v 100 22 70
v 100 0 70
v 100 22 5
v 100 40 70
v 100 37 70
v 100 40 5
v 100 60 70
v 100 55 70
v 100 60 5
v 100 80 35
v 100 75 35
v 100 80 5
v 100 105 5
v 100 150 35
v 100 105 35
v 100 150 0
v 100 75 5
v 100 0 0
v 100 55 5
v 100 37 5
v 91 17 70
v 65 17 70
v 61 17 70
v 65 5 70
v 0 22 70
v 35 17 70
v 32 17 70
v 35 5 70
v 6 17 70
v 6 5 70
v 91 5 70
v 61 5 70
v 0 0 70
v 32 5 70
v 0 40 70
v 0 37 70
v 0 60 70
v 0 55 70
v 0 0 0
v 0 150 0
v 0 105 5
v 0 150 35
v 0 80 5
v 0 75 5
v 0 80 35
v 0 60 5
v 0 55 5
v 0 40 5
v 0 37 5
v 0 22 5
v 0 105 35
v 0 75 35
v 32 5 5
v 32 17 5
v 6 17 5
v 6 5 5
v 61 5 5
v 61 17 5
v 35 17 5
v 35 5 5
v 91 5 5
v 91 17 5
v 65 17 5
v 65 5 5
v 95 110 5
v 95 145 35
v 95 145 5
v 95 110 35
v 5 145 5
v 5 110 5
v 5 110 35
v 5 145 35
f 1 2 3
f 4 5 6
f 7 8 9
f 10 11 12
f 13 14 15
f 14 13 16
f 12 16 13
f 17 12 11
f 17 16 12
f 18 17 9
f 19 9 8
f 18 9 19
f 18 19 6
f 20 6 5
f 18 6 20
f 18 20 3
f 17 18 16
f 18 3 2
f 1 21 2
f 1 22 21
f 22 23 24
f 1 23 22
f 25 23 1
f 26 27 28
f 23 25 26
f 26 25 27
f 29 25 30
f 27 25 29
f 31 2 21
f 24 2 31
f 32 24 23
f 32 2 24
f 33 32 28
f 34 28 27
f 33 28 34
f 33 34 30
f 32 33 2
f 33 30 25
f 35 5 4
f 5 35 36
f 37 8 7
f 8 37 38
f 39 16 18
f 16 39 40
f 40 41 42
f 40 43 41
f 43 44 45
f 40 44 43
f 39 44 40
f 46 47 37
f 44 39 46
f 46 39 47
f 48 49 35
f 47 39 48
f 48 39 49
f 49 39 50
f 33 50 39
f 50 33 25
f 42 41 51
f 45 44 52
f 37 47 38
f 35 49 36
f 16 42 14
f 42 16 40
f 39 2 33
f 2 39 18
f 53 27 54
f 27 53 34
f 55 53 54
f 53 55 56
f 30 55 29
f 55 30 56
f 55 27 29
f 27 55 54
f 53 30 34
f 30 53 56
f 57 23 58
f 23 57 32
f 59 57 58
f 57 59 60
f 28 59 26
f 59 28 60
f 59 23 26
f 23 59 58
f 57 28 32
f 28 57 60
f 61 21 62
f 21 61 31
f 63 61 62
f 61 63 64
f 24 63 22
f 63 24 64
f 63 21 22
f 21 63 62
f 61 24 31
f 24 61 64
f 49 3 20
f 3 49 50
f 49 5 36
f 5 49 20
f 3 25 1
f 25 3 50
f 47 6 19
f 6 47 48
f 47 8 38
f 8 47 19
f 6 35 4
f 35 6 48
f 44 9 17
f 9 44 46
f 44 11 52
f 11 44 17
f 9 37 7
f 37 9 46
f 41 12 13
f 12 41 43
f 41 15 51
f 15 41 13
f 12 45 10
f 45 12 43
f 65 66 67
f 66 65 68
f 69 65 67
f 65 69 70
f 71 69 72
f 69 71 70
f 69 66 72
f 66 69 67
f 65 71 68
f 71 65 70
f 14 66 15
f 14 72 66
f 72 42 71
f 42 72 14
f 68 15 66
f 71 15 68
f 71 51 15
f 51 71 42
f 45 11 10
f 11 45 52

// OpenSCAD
difference()
{
  cube([100,150,70]);
  translate([6,5,5]) cube([26,12,80]);
  translate([35,5,5]) cube([26,12,80]);
  translate([65,5,5]) cube([26,12,80]);
  translate([-1,22,5]) cube([105,15,80]);
  translate([-1,40,5]) cube([105,15,80]);
  translate([-1,60,5]) cube([105,15,80]);
  translate([-1,80,5]) cube([105,25,80]);
  translate([5,110,5]) cube([90,35,80]);
  translate([-1,60,35]) cube([105,155,80]);
}
